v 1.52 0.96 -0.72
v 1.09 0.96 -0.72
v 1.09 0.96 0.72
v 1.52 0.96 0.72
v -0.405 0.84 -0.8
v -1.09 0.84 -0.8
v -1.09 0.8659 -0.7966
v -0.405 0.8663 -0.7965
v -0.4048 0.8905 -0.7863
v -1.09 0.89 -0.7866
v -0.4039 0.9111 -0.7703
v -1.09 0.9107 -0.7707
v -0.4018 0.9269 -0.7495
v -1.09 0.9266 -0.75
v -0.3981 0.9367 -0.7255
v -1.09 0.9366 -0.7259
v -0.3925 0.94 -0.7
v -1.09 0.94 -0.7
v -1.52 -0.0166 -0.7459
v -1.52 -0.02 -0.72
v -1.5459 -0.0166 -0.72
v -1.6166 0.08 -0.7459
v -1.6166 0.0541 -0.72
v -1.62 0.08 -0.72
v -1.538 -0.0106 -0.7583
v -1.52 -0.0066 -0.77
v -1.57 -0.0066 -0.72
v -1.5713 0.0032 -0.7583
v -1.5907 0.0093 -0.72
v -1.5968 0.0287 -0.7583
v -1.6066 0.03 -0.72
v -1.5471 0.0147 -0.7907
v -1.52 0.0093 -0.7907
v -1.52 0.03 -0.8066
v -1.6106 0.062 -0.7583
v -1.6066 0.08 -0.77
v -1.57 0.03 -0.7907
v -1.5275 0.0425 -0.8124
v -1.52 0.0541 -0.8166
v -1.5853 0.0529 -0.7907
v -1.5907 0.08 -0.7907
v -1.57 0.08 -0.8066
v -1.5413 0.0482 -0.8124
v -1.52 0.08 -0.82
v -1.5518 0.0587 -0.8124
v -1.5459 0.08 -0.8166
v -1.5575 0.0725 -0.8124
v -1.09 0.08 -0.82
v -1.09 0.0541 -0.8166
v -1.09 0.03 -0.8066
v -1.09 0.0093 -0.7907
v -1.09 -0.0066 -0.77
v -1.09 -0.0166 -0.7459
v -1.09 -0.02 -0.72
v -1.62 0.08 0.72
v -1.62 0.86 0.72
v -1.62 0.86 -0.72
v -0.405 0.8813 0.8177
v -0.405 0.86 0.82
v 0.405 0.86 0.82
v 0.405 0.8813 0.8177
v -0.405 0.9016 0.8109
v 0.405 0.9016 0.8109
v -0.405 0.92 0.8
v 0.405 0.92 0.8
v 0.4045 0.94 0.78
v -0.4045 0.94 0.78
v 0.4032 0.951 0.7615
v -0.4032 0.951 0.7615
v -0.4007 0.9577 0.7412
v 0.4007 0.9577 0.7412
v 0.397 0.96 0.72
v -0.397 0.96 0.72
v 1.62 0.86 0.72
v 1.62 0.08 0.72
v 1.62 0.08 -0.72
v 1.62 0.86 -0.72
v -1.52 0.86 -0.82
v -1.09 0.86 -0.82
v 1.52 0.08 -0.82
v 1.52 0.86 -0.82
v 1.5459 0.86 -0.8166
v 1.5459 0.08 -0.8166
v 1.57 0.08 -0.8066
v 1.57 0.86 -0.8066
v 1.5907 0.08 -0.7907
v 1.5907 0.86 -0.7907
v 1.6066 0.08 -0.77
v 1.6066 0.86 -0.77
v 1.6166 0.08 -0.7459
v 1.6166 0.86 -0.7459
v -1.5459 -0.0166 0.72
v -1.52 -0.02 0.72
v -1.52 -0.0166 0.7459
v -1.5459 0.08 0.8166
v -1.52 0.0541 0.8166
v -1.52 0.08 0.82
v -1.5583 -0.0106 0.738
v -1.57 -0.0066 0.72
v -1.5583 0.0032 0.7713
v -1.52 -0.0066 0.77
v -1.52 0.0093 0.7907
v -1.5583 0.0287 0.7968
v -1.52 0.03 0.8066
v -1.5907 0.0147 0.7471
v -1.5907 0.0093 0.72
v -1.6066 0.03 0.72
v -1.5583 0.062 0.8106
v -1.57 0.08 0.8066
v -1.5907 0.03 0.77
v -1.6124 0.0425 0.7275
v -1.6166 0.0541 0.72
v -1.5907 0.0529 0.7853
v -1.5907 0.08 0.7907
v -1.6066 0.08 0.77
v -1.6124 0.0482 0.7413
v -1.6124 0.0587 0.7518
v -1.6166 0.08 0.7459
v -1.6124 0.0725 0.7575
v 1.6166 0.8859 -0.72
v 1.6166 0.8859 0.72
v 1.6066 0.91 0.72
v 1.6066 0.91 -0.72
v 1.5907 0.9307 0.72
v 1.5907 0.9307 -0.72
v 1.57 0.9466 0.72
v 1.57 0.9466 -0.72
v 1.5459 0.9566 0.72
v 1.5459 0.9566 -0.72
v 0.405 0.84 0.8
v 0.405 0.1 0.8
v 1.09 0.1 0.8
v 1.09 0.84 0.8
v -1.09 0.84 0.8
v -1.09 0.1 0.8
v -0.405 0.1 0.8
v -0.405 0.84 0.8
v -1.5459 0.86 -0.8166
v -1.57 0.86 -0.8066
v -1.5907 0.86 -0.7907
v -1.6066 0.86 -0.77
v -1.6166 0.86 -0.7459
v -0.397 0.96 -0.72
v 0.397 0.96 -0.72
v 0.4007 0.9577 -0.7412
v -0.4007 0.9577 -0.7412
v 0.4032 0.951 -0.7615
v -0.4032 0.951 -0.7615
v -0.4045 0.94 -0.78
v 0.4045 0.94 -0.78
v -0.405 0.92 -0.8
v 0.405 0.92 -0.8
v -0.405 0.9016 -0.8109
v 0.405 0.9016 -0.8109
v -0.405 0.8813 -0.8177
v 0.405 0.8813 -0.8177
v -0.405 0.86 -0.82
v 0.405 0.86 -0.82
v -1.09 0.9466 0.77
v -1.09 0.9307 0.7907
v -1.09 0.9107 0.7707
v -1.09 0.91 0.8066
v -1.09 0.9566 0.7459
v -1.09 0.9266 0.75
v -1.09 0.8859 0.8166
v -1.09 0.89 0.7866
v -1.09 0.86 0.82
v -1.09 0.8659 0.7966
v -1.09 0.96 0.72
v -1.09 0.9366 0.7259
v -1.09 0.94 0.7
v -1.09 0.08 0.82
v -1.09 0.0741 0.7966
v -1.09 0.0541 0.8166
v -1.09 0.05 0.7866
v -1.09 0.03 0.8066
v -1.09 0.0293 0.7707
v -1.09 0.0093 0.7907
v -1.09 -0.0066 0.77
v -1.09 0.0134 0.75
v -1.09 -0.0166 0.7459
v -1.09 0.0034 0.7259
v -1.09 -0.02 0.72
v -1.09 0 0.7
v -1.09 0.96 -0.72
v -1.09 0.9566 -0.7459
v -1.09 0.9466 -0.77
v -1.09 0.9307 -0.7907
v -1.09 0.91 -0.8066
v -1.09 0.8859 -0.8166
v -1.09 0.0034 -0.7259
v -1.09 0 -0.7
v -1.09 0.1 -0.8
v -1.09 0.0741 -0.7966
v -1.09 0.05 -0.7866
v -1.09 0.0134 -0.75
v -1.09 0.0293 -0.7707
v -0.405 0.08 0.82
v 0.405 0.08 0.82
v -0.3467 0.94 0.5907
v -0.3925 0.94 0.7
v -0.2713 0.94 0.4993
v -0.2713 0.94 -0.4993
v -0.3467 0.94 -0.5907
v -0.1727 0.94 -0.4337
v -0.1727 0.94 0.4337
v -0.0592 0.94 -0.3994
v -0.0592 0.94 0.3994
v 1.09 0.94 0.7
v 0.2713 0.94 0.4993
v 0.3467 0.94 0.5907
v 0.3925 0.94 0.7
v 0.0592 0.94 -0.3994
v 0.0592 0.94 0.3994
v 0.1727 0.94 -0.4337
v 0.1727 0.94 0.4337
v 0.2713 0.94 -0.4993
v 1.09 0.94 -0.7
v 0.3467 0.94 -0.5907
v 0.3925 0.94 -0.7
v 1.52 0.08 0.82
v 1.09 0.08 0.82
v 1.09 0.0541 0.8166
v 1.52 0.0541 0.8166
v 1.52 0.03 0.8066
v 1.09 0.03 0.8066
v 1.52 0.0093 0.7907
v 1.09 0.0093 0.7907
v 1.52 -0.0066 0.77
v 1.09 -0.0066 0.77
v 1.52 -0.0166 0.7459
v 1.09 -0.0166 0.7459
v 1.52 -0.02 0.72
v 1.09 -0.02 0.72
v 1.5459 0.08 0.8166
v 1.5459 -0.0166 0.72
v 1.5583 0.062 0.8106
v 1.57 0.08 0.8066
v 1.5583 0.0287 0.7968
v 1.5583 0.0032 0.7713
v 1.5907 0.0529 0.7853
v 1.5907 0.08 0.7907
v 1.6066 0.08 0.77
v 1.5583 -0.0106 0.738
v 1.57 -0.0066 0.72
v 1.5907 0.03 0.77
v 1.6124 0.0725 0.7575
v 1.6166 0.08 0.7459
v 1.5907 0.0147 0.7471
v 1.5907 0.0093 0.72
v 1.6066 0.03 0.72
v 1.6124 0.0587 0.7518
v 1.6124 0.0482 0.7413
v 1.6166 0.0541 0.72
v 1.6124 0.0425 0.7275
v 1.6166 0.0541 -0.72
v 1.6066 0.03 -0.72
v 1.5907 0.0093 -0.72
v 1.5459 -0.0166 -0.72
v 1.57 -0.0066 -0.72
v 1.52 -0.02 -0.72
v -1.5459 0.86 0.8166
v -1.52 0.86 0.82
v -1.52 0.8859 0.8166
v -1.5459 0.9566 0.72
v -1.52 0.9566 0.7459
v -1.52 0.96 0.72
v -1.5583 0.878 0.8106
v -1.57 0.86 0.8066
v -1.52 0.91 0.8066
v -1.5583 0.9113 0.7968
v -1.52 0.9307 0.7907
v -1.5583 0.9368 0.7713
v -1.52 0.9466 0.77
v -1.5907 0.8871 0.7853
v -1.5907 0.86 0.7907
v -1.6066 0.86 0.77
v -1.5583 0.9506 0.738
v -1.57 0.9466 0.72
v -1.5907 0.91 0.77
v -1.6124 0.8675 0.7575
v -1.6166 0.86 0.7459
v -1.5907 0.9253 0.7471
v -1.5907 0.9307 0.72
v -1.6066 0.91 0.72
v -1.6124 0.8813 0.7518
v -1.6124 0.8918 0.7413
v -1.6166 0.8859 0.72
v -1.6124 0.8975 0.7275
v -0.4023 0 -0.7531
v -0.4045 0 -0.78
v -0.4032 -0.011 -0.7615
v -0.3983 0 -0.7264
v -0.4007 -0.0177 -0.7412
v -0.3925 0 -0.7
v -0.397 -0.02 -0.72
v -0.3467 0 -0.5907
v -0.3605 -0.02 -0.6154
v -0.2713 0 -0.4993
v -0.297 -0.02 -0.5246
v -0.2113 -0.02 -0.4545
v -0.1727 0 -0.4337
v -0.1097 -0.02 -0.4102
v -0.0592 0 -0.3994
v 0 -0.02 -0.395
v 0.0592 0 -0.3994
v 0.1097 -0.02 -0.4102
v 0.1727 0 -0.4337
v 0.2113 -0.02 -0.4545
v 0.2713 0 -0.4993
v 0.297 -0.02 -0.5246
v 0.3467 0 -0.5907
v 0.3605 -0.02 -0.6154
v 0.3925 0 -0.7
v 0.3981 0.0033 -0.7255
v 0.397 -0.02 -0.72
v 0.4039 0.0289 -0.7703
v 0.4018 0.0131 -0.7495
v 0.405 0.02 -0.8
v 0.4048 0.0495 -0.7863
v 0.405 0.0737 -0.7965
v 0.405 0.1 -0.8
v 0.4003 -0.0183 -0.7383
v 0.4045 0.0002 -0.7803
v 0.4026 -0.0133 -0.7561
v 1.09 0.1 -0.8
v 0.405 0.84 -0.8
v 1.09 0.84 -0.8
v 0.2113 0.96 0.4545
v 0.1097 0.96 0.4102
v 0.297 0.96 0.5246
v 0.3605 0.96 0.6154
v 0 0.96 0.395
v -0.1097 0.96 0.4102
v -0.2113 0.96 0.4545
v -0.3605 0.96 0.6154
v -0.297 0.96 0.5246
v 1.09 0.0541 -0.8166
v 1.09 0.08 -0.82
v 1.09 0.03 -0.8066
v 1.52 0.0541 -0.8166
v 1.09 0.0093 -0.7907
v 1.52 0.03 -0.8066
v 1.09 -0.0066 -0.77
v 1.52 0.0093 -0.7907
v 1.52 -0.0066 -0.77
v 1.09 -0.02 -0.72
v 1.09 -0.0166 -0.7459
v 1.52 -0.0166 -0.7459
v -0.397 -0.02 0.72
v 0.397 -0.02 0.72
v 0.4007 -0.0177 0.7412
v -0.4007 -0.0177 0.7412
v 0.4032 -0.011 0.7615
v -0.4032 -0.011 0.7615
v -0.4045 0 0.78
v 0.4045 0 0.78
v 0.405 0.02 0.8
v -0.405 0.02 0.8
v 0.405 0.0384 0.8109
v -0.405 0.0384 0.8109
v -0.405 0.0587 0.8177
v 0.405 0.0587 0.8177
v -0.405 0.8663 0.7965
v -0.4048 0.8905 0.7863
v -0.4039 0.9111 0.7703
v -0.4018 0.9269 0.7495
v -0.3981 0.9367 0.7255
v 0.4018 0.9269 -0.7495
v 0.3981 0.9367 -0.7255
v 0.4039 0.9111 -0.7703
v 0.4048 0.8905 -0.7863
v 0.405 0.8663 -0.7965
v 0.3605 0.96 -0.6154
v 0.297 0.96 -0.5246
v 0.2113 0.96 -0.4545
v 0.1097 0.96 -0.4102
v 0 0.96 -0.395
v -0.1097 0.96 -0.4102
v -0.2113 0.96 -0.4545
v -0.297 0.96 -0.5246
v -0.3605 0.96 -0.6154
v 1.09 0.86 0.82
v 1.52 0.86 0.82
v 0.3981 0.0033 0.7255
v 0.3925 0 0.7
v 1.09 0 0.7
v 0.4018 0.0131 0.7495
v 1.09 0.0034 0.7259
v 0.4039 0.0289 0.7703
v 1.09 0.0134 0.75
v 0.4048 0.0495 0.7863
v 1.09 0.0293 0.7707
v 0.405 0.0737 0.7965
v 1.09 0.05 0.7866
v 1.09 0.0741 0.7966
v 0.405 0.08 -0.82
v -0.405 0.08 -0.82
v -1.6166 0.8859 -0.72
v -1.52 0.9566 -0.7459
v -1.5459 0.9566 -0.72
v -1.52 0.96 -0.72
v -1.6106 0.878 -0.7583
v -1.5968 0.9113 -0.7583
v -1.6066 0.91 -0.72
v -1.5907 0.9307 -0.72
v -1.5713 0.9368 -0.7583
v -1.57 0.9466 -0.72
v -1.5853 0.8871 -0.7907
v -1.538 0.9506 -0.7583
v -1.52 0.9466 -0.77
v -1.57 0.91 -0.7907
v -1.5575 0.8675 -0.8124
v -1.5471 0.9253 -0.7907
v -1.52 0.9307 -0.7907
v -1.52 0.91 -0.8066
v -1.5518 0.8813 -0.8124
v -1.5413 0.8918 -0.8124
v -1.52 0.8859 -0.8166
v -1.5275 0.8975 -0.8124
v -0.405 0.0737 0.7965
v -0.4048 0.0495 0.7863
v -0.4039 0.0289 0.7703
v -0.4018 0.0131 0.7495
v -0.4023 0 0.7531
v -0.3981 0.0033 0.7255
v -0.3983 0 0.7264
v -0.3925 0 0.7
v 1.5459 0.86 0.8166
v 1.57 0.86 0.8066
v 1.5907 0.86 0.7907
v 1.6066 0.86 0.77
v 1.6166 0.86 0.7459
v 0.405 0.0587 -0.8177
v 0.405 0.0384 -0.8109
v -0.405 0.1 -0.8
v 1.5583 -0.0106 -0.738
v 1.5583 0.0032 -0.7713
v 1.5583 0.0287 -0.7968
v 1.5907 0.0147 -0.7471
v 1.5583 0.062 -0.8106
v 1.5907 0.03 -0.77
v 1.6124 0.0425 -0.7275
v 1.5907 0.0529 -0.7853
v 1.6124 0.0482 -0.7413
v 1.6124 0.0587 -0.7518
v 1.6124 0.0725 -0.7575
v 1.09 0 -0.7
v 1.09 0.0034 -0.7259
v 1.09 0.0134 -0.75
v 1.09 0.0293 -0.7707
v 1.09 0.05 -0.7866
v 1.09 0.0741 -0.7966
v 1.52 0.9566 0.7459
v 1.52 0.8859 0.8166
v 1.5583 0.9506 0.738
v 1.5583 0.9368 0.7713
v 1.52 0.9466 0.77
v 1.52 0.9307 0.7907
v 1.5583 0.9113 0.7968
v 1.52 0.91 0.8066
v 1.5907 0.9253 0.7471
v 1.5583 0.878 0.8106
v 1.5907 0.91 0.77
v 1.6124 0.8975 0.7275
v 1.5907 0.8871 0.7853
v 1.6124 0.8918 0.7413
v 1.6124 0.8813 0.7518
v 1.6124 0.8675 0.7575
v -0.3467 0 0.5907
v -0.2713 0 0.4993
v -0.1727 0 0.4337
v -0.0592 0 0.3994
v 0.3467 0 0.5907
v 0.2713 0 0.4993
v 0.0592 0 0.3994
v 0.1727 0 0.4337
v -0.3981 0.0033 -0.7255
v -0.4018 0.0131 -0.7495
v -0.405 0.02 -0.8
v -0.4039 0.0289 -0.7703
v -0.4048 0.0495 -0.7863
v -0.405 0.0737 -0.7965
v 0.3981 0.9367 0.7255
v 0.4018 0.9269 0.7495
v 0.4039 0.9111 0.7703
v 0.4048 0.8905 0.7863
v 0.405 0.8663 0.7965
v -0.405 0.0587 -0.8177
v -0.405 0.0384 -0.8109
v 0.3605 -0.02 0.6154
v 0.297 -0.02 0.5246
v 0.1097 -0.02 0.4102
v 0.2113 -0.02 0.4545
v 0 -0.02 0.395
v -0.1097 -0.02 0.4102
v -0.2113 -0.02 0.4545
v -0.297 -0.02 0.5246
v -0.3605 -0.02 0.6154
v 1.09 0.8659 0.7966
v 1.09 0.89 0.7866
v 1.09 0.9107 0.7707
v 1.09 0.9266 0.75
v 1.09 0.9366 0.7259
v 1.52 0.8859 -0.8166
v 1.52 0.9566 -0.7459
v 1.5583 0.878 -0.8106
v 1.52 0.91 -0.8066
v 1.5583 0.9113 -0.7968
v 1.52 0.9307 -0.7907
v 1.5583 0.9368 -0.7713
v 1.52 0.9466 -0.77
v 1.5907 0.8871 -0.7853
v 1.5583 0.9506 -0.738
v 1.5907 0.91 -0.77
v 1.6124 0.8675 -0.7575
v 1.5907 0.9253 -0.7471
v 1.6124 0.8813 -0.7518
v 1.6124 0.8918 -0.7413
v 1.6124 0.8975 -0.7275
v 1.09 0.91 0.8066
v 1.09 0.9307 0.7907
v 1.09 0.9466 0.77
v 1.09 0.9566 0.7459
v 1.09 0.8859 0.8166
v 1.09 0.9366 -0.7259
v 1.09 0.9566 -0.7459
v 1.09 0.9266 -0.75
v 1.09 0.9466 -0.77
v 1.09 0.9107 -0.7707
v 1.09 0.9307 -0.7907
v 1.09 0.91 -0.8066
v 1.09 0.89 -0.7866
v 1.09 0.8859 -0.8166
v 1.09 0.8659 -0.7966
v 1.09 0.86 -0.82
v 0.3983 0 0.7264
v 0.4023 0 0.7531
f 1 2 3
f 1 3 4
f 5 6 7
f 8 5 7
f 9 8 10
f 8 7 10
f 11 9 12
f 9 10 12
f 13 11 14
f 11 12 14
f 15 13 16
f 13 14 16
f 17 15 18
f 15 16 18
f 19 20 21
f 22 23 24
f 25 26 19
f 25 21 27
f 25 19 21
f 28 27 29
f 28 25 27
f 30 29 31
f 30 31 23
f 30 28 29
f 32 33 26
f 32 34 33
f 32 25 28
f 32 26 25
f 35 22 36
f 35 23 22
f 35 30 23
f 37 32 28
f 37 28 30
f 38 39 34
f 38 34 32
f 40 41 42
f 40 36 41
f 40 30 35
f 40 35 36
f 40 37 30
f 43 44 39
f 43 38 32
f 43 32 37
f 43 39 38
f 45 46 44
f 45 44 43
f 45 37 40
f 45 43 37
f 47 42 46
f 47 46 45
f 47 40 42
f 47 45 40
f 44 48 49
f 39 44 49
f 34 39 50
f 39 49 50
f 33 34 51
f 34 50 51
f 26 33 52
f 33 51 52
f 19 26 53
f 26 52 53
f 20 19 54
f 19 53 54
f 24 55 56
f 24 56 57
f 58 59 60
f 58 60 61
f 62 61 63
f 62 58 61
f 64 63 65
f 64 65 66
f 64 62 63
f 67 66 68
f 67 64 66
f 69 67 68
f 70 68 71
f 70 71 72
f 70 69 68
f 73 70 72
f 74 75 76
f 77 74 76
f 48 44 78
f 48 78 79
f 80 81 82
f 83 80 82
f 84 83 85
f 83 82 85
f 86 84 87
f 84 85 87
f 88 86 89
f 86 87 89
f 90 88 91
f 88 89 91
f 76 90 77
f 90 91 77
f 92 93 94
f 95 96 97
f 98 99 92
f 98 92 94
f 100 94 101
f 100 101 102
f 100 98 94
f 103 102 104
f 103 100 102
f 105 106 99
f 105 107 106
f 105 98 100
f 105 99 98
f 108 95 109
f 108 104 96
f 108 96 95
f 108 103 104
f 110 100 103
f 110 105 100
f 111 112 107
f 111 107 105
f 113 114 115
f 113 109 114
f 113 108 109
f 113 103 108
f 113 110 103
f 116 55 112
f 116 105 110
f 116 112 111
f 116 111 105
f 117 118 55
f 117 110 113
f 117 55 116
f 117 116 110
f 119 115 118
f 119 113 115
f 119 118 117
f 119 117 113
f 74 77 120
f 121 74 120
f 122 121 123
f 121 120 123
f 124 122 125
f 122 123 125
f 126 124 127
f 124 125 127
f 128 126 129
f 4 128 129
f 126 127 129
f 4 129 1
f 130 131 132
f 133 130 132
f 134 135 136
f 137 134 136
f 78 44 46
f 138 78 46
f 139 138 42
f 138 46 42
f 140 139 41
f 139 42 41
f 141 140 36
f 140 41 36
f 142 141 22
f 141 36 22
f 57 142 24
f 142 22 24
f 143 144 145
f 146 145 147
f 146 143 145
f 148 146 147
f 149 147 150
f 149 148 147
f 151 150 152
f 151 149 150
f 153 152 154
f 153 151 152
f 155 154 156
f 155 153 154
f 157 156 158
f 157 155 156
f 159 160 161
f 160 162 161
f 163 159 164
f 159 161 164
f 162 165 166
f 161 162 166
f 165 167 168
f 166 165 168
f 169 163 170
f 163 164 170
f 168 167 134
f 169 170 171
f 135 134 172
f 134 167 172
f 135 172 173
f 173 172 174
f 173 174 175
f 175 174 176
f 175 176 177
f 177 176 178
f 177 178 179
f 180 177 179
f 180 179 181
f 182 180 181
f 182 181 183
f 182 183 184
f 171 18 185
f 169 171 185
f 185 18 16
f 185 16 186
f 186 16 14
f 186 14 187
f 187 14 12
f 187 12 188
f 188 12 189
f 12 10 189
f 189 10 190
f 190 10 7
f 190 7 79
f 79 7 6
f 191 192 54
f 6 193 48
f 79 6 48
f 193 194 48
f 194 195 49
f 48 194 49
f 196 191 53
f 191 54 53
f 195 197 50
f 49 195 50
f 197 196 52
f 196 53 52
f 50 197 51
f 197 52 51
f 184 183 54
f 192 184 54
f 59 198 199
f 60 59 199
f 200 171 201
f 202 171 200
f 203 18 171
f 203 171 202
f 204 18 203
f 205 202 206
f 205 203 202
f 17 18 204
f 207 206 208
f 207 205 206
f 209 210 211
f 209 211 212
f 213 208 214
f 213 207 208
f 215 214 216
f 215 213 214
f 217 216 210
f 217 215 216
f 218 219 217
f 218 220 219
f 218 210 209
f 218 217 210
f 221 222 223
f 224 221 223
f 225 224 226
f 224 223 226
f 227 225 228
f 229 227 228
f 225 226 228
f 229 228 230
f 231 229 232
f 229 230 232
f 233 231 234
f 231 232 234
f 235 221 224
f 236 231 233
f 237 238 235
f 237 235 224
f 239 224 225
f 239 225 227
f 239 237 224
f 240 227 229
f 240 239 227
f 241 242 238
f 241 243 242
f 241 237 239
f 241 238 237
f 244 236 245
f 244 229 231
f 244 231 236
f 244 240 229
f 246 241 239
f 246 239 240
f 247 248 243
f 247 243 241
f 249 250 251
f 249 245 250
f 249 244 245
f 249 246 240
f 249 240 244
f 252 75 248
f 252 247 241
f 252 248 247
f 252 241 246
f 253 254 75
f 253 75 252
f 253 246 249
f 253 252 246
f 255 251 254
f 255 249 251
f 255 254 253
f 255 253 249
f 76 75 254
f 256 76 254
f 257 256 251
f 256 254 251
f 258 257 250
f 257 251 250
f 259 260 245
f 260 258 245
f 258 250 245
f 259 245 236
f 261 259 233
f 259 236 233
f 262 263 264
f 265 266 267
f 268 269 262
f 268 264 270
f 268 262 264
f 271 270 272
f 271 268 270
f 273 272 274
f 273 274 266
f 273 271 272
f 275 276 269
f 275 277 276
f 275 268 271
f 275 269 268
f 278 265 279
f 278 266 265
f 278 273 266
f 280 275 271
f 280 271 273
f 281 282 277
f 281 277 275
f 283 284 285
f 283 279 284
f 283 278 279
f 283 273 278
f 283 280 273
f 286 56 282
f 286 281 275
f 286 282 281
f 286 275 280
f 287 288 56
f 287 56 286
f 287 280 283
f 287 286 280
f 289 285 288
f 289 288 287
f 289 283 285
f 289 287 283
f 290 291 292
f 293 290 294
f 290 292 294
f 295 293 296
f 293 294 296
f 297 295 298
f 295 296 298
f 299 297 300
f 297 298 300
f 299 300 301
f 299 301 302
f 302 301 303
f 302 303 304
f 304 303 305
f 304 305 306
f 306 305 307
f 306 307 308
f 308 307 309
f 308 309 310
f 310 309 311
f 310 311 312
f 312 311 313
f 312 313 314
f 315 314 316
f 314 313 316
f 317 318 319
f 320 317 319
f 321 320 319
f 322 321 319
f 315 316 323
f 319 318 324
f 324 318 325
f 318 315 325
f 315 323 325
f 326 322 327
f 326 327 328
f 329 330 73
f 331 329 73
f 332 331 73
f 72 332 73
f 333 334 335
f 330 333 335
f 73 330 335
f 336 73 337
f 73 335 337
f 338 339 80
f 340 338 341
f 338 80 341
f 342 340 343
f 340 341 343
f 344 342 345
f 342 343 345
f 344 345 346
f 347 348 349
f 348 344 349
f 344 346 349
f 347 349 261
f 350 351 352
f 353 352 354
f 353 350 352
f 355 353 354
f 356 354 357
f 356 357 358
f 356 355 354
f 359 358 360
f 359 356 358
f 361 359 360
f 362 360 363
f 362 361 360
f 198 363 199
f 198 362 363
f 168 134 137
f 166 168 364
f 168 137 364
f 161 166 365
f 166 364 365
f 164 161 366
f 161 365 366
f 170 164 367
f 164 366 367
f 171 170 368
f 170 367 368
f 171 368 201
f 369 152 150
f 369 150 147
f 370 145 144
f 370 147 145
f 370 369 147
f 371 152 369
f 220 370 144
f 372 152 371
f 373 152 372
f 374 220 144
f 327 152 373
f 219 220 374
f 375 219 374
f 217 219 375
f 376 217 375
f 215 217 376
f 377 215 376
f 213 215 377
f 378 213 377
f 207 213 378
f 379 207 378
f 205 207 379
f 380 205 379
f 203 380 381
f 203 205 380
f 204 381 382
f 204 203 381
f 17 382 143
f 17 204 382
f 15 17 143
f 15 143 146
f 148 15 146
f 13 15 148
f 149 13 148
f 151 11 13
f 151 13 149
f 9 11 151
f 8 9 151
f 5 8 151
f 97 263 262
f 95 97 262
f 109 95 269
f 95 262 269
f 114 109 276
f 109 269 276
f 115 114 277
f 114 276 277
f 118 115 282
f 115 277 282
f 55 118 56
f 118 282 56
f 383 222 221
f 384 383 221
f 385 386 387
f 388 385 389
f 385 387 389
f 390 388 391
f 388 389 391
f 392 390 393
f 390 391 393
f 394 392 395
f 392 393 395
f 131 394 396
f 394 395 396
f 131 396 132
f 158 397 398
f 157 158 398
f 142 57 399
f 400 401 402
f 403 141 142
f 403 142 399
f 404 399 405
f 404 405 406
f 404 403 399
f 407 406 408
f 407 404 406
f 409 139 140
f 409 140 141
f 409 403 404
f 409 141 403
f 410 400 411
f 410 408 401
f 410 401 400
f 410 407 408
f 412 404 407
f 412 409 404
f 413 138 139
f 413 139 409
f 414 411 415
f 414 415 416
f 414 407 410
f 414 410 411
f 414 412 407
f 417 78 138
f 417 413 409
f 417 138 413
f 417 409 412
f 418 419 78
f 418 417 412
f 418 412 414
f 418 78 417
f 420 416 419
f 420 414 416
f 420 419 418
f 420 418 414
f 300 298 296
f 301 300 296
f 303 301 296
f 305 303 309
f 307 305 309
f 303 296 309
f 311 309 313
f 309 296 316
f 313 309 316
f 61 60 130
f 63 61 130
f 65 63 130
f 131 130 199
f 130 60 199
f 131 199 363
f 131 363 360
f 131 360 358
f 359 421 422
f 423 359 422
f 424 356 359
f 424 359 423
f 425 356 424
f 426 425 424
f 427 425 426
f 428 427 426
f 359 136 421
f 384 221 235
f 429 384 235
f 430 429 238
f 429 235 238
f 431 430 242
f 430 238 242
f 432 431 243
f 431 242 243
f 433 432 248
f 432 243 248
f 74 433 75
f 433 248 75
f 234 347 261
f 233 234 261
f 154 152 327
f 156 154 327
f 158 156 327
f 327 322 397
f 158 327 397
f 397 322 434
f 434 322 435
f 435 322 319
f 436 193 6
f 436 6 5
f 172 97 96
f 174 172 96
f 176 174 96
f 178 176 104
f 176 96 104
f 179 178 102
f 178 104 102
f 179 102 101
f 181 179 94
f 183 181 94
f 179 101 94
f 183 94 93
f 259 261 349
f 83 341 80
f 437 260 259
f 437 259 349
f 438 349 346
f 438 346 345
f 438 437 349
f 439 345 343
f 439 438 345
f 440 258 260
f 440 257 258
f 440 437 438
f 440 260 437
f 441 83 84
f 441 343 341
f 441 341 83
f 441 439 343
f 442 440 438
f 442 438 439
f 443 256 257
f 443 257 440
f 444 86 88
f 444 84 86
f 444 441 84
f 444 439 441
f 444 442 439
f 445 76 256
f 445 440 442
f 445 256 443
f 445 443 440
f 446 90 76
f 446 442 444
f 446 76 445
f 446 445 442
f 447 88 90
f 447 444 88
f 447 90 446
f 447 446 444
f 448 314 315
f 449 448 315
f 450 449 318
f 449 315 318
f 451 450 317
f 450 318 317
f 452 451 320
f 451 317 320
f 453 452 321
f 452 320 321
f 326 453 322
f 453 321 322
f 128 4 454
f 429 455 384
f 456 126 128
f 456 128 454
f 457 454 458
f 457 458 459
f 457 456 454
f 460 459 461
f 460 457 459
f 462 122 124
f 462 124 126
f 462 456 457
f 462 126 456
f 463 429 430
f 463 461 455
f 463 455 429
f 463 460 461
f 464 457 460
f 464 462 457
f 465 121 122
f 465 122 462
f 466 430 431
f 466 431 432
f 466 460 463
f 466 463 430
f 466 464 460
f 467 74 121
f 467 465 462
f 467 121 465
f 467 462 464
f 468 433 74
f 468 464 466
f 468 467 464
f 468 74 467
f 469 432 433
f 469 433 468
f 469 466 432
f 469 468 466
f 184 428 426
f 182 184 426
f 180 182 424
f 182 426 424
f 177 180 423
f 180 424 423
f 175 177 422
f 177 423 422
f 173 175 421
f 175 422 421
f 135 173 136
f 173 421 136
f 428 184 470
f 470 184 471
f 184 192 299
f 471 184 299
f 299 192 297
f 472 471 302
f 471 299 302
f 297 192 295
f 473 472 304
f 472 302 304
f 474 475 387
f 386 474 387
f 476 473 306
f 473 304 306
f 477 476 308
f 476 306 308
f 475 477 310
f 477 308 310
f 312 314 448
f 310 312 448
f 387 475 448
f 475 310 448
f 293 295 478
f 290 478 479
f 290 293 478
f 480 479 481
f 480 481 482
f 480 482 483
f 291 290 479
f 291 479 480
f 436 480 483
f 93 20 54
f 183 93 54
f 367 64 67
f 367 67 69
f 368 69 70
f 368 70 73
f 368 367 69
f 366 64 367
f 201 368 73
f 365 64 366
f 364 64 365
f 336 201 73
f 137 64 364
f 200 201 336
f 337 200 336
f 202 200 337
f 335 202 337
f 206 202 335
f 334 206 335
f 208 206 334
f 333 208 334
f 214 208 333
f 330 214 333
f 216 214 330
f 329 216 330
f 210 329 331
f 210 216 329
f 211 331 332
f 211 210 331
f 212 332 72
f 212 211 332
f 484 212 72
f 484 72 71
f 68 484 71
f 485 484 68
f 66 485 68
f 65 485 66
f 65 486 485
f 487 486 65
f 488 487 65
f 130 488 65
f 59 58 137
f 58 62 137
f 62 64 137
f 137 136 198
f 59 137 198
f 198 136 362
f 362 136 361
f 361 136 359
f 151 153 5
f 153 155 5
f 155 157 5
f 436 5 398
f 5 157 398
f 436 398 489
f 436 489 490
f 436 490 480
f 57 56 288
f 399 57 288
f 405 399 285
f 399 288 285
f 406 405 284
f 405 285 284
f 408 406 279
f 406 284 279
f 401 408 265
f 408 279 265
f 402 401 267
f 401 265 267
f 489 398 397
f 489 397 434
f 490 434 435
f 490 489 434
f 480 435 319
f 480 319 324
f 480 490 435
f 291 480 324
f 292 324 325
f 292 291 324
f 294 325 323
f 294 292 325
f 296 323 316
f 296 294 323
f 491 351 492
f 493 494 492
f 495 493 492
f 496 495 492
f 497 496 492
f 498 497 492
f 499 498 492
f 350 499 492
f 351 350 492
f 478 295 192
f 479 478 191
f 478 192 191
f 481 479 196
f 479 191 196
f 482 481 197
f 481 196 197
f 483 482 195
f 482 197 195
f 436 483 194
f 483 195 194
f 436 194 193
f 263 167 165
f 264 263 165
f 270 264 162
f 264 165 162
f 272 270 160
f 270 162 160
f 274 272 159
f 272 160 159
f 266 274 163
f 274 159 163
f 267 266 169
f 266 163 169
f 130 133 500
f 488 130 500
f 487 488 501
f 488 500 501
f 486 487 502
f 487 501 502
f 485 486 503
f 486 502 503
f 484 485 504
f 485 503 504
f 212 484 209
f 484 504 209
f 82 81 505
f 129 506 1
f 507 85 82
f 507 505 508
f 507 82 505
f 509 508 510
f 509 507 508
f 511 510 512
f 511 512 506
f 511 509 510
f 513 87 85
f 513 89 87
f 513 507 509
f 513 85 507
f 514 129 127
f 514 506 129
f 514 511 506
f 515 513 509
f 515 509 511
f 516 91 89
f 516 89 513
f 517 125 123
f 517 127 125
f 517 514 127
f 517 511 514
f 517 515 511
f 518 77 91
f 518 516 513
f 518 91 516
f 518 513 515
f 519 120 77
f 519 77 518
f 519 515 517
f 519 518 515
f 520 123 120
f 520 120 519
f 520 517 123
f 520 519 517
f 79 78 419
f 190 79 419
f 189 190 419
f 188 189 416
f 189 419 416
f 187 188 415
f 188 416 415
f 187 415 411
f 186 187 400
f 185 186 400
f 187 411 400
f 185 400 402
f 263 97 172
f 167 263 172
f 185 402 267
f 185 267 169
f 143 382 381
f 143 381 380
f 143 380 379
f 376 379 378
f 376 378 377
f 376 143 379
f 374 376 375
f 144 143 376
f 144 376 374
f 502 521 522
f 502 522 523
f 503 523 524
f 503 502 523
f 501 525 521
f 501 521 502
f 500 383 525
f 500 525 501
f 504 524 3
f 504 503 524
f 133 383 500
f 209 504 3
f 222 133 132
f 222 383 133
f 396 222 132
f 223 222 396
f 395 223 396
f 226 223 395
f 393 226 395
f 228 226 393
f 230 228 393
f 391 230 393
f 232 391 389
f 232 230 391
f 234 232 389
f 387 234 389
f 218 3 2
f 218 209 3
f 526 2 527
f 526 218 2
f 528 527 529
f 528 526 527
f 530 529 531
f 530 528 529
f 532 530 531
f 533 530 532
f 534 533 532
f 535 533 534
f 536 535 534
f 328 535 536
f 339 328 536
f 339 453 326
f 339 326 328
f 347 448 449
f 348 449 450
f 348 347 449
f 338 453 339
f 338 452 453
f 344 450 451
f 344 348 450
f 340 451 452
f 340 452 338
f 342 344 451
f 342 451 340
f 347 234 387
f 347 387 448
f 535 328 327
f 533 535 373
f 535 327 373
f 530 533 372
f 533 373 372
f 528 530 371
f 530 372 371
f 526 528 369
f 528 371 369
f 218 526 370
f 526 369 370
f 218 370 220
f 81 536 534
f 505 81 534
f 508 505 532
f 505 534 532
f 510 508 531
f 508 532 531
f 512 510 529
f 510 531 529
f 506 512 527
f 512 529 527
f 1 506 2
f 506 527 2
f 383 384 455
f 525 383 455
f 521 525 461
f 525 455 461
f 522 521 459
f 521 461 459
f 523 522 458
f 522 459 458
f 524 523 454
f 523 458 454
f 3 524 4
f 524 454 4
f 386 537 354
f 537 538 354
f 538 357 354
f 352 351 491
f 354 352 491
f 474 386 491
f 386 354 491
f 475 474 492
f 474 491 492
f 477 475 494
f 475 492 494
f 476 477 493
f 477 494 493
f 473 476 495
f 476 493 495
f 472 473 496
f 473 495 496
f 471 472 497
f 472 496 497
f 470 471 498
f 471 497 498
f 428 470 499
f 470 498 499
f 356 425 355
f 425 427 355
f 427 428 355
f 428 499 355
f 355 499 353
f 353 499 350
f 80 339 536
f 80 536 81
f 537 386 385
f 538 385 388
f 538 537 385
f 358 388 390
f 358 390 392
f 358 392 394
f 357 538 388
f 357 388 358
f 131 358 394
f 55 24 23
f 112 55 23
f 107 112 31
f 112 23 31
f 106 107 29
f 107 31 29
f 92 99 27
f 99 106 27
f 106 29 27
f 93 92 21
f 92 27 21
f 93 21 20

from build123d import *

# Parameters (mm, degrees)
SKETCH1_W           = 3.2
SKETCH1_H           = 1.6
BOSS_EXTRUDE1_DEPTH = 0.94
SKETCH2_W           = 0.53
SKETCH2_H           = 1.64
BOSS_EXTRUDE2_DEPTH = 0.02
BOSS_EXTRUDE3_START = -0.96
SKETCH3_W           = 0.53
SKETCH3_H           = 1.64
BOSS_EXTRUDE3_DEPTH = 0.96
FILLET1_R           = 0.1
FILLET2_START       = -1
FILLET2_DEPTH       = 2


with BuildPart() as part:
    # Sketch1 → Boss-Extrude1 (new body)
    with BuildSketch(Plane(origin=(0, 0, 0), x_dir=(1, 0, 0), z_dir=(0, 1, 0))):
        Rectangle(SKETCH1_W, SKETCH1_H)
    extrude(amount=BOSS_EXTRUDE1_DEPTH)

    # Sketch2 → Boss-Extrude2 (add)
    with BuildSketch(Plane(origin=(0, 0.94, 0), x_dir=(1, 0, 0), z_dir=(0, 1, 0))):
        with BuildLine():
            Line((-0.405, 0.82), (-0.405, 0.8))
            ThreePointArc((-0.405, 0.8), (0, 0.395), (0.405, 0.8))
            Line((0.405, 0.8), (0.405, 0.82))
            Line((0.405, 0.82), (-0.405, 0.82))
        make_face()
        with Locations((-1.355, 0)):
            Rectangle(SKETCH2_W, SKETCH2_H)
        with Locations((1.355, 0)):
            Rectangle(SKETCH2_W, SKETCH2_H)
        with BuildLine():
            Line((-0.405, -0.82), (-0.405, -0.8))
            ThreePointArc((-0.405, -0.8), (0, -0.395), (0.405, -0.8))
            Line((0.405, -0.8), (0.405, -0.82))
            Line((0.405, -0.82), (-0.405, -0.82))
        make_face()
    extrude(amount=BOSS_EXTRUDE2_DEPTH)

    # Sketch3 → Boss-Extrude3 (add)
    with BuildSketch(Plane(origin=(0, 0.94, 0), x_dir=(1, 0, 0), z_dir=(0, 1, 0)).offset(BOSS_EXTRUDE3_START)):
        with Locations((-1.355, 0)):
            Rectangle(SKETCH3_W, SKETCH3_H)
        with BuildLine():
            Line((-0.405, 0.82), (-0.405, 0.8))
            ThreePointArc((-0.405, 0.8), (0, 0.395), (0.405, 0.8))
            Line((0.405, 0.8), (0.405, 0.82))
            Line((0.405, 0.82), (-0.405, 0.82))
        make_face()
        with BuildLine():
            Line((-0.405, -0.8), (-0.405, -0.82))
            Line((-0.405, -0.82), (0.405, -0.82))
            Line((0.405, -0.82), (0.405, -0.8))
            ThreePointArc((0.405, -0.8), (0, -0.395), (-0.405, -0.8))
        make_face()
        with Locations((1.355, 0)):
            Rectangle(SKETCH3_W, SKETCH3_H)
    extrude(amount=BOSS_EXTRUDE3_DEPTH)

    # Fillet1
    # the kernel refuses this fillet: 0.1 mm, written as the material it takes off along each edge
    with BuildSketch(Plane(origin=(1.52, 0.08, 0.72), x_dir=(0, -1, 0), z_dir=(1, 0, 0))) as fillet1_piece_1_section:
        Polygon((0, 0), (FILLET1_R, 0), (FILLET1_R, -FILLET1_R), (0, -FILLET1_R), align=None)
    fillet1_piece_1 = extrude(amount=FILLET1_R, mode=Mode.PRIVATE)
    fillet1_piece_1 = fillet1_piece_1 - Plane(origin=(1.52, 0.08, 0.72), x_dir=(1.184975440516056e-15, 0.7071067811865475, -0.7071067811865475), z_dir=(1, 0, 0)) * Sphere(FILLET1_R, mode=Mode.PRIVATE)
    add(fillet1_piece_1, mode=Mode.SUBTRACT)
    with BuildSketch(Plane(origin=(1.52, 0.08, -0.72), x_dir=(0, 0, -1), z_dir=(1, 0, 0))) as fillet1_piece_2_section:
        Polygon((0, 0), (FILLET1_R, 0), (FILLET1_R, -FILLET1_R), (0, -FILLET1_R), align=None)
    fillet1_piece_2 = extrude(amount=FILLET1_R, mode=Mode.PRIVATE)
    fillet1_piece_2 = fillet1_piece_2 - Plane(origin=(1.52, 0.08, -0.72), x_dir=(0, 0.7071067811865475, 0.7071067811865475), z_dir=(1, 0, 0)) * Sphere(FILLET1_R, mode=Mode.PRIVATE)
    add(fillet1_piece_2, mode=Mode.SUBTRACT)
    with BuildSketch(Plane(origin=(-1.52, 0.08, -0.72), x_dir=(-1, 0, 0), z_dir=(0, 0, -1))) as fillet1_piece_3_section:
        Polygon((0, 0), (FILLET1_R, 0), (FILLET1_R, -FILLET1_R), (0, -FILLET1_R), align=None)
    fillet1_piece_3 = extrude(amount=FILLET1_R, mode=Mode.PRIVATE)
    fillet1_piece_3 = fillet1_piece_3 - Plane(origin=(-1.52, 0.08, -0.72), x_dir=(0.7071067811865475, 0.7071067811865475, 0), z_dir=(0, 0, -1)) * Sphere(FILLET1_R, mode=Mode.PRIVATE)
    add(fillet1_piece_3, mode=Mode.SUBTRACT)
    with BuildSketch(Plane(origin=(-1.52, 0.86, -0.72), x_dir=(-1, 0, 0), z_dir=(0, 0, -1))) as fillet1_piece_4_section:
        Polygon((0, 0), (FILLET1_R, 0), (FILLET1_R, FILLET1_R), (0, FILLET1_R), align=None)
    fillet1_piece_4 = extrude(amount=FILLET1_R, mode=Mode.PRIVATE)
    fillet1_piece_4 = fillet1_piece_4 - Plane(origin=(-1.52, 0.86, -0.72), x_dir=(0.7071067811865475, -0.7071067811865475, 0), z_dir=(0, 0, -1)) * Sphere(FILLET1_R, mode=Mode.PRIVATE)
    add(fillet1_piece_4, mode=Mode.SUBTRACT)
    with BuildSketch(Plane(origin=(-1.52, 0.86, 0.72), x_dir=(0, 1, 0), z_dir=(-1, 0, 0))) as fillet1_piece_5_section:
        Polygon((0, 0), (FILLET1_R, 0), (FILLET1_R, -FILLET1_R), (0, -FILLET1_R), align=None)
    fillet1_piece_5 = extrude(amount=FILLET1_R, mode=Mode.PRIVATE)
    fillet1_piece_5 = fillet1_piece_5 - Plane(origin=(-1.52, 0.86, 0.72), x_dir=(0, -0.7071067811865475, -0.7071067811865475), z_dir=(-1, 0, 0)) * Sphere(FILLET1_R, mode=Mode.PRIVATE)
    add(fillet1_piece_5, mode=Mode.SUBTRACT)
    with BuildSketch(Plane(origin=(-1.52, 0.08, 0.72), x_dir=(0, 0, 1), z_dir=(-1, 0, 0))) as fillet1_piece_6_section:
        Polygon((0, 0), (FILLET1_R, 0), (FILLET1_R, -FILLET1_R), (0, -FILLET1_R), align=None)
    fillet1_piece_6 = extrude(amount=FILLET1_R, mode=Mode.PRIVATE)
    fillet1_piece_6 = fillet1_piece_6 - Plane(origin=(-1.52, 0.08, 0.72), x_dir=(0, 0.7071067811865475, -0.7071067811865475), z_dir=(-1, 0, 0)) * Sphere(FILLET1_R, mode=Mode.PRIVATE)
    add(fillet1_piece_6, mode=Mode.SUBTRACT)
    with BuildSketch(Plane(origin=(1.52, 0.86, 0.72), x_dir=(0, 1, 0), z_dir=(1, 0, 0))) as fillet1_piece_7_section:
        Polygon((0, 0), (FILLET1_R, 0), (FILLET1_R, FILLET1_R), (0, FILLET1_R), align=None)
    fillet1_piece_7 = extrude(amount=FILLET1_R, mode=Mode.PRIVATE)
    fillet1_piece_7 = fillet1_piece_7 - Plane(origin=(1.52, 0.86, 0.72), x_dir=(1.184975440516056e-15, -0.7071067811865475, -0.7071067811865475), z_dir=(1, 0, 0)) * Sphere(FILLET1_R, mode=Mode.PRIVATE)
    add(fillet1_piece_7, mode=Mode.SUBTRACT)
    with BuildSketch(Plane(origin=(1.52, 0.86, -0.72), x_dir=(0, 1, 0), z_dir=(1, 0, 0))) as fillet1_piece_8_section:
        Polygon((0, 0), (FILLET1_R, 0), (FILLET1_R, -FILLET1_R), (0, -FILLET1_R), align=None)
    fillet1_piece_8 = extrude(amount=FILLET1_R, mode=Mode.PRIVATE)
    fillet1_piece_8 = fillet1_piece_8 - Plane(origin=(1.52, 0.86, -0.72), x_dir=(0, -0.7071067811865475, 0.7071067811865475), z_dir=(1, 0, 0)) * Sphere(FILLET1_R, mode=Mode.PRIVATE)
    add(fillet1_piece_8, mode=Mode.SUBTRACT)
    with BuildSketch(Plane(origin=(0.155, 0, -0.8), x_dir=(0, 1, 0), z_dir=(1, 0, 0))) as fillet1_piece_9_section:
        with BuildLine():
            CenterArc((FILLET1_R, FILLET1_R), FILLET1_R, 180, 90)
            Line((0, FILLET1_R), (0, 0))
            Line((0, 0), (FILLET1_R, 0))
        make_face()
    fillet1_piece_9 = extrude(amount=0.935, mode=Mode.PRIVATE)
    fillet1_piece_9 = fillet1_piece_9 - Plane(origin=(0, 0, -0.8), x_dir=(-1, 0, 0), z_dir=(0, -1, 0)) * Cylinder(0.405, 3, mode=Mode.PRIVATE)
    add(fillet1_piece_9, mode=Mode.SUBTRACT)
    with BuildSketch(Plane(origin=(1.62, -0.02, 0.72), x_dir=(0, 1, 0), z_dir=(0, 0, -1)), Plane(origin=(-1.62, 0.96, 0.72), x_dir=(0, -1, 0), z_dir=(0, 0, -1)), Plane(origin=(1.62, 0.96, -0.72), x_dir=(0, -1, 0), z_dir=(0, 0, 1)), Plane(origin=(-1.62, -0.02, -0.72), x_dir=(0, 1, 0), z_dir=(0, 0, 1))) as fillet1_piece_10:
        with BuildLine():
            CenterArc((FILLET1_R, -FILLET1_R), FILLET1_R, 90, 90)
            Line((0, -FILLET1_R), (0, 0))
            Line((0, 0), (FILLET1_R, 0))
        make_face()
    extrude(amount=1.44, mode=Mode.SUBTRACT)
    with BuildSketch(Plane(origin=(0.84, -0.02, 0.82), x_dir=(0, 1, 0), z_dir=(1, 0, 0)), Plane(origin=(1.52, -0.02, -0.82), x_dir=(0, 1, 0), z_dir=(-1, 0, 0)), Plane(origin=(-1.52, 0.96, -0.82), x_dir=(0, -1, 0), z_dir=(1, 0, 0)), Plane(origin=(1.52, 0.96, 0.82), x_dir=(0, -1, 0), z_dir=(-1, 0, 0)), Plane(origin=(-0.84, -0.02, -0.82), x_dir=(0, 1, 0), z_dir=(-1, 0, 0)), Plane(origin=(-1.52, -0.02, 0.82), x_dir=(0, 1, 0), z_dir=(1, 0, 0))) as fillet1_piece_11:
        with BuildLine():
            CenterArc((FILLET1_R, -FILLET1_R), FILLET1_R, 90, 90)
            Line((0, -FILLET1_R), (0, 0))
            Line((0, 0), (FILLET1_R, 0))
        make_face()
    extrude(amount=0.68, mode=Mode.SUBTRACT)
    with BuildSketch(Plane(origin=(-0.155, 0.94, 0.8), x_dir=(0, -1, 0), z_dir=(-1, 0, 0))) as fillet1_piece_12_section:
        with BuildLine():
            CenterArc((FILLET1_R, -FILLET1_R), FILLET1_R, 90, 90)
            Line((0, -FILLET1_R), (0, 0))
            Line((0, 0), (FILLET1_R, 0))
        make_face()
    fillet1_piece_12 = extrude(amount=0.935, mode=Mode.PRIVATE)
    fillet1_piece_12 = fillet1_piece_12 - Plane(origin=(0, 0.94, 0.8), x_dir=(-1, 0, 0), z_dir=(0, -1, 0)) * Cylinder(0.405, 3, mode=Mode.PRIVATE)
    add(fillet1_piece_12, mode=Mode.SUBTRACT)
    with BuildSketch(Plane(origin=(-1.62, 0.08, -0.82), x_dir=(1, 0, 0), z_dir=(0, 1, 0)), Plane(origin=(1.62, 0.08, 0.82), x_dir=(-1, 0, 0), z_dir=(0, 1, 0))) as fillet1_piece_13:
        with BuildLine():
            CenterArc((FILLET1_R, -FILLET1_R), FILLET1_R, 90, 90)
            Line((0, -FILLET1_R), (0, 0))
            Line((0, 0), (FILLET1_R, 0))
        make_face()
    extrude(amount=0.78, mode=Mode.SUBTRACT)
    with BuildSketch(Plane(origin=(-1.62, 0.86, 0.82), x_dir=(0, 0, -1), z_dir=(0, -1, 0)), Plane(origin=(1.62, 0.86, -0.82), x_dir=(0, 0, 1), z_dir=(0, -1, 0))) as fillet1_piece_14:
        with BuildLine():
            CenterArc((FILLET1_R, FILLET1_R), FILLET1_R, 180, 90)
            Line((0, FILLET1_R), (0, 0))
            Line((0, 0), (FILLET1_R, 0))
        make_face()
    extrude(amount=0.78, mode=Mode.SUBTRACT)
    with BuildSketch(Plane(origin=(-0.84, 0.96, 0.82), x_dir=(0, 0, -1), z_dir=(-1, 0, 0)), Plane(origin=(0.84, 0.96, -0.82), x_dir=(0, 0, 1), z_dir=(1, 0, 0))) as fillet1_piece_15:
        with BuildLine():
            CenterArc((FILLET1_R, FILLET1_R), FILLET1_R, 180, 90)
            Line((0, FILLET1_R), (0, 0))
            Line((0, 0), (FILLET1_R, 0))
        make_face()
    extrude(amount=0.68, mode=Mode.SUBTRACT)
    with BuildSketch(Plane(origin=(-1.09, 0.94, -0.8), x_dir=(0, -1, 0), z_dir=(1, 0, 0))) as fillet1_piece_16_section:
        with BuildLine():
            CenterArc((FILLET1_R, -FILLET1_R), FILLET1_R, 90, 90)
            Line((0, -FILLET1_R), (0, 0))
            Line((0, 0), (FILLET1_R, 0))
        make_face()
    fillet1_piece_16 = extrude(amount=0.935, mode=Mode.PRIVATE)
    fillet1_piece_16 = fillet1_piece_16 - Plane(origin=(0, 0.94, -0.8), x_dir=(-1, 0, 0), z_dir=(0, -1, 0)) * Cylinder(0.405, 3, mode=Mode.PRIVATE)
    add(fillet1_piece_16, mode=Mode.SUBTRACT)
    with BuildSketch(Plane(origin=(0.155, 0.94, -0.8), x_dir=(0, -1, 0), z_dir=(1, 0, 0))) as fillet1_piece_17_section:
        with BuildLine():
            CenterArc((FILLET1_R, -FILLET1_R), FILLET1_R, 90, 90)
            Line((0, -FILLET1_R), (0, 0))
            Line((0, 0), (FILLET1_R, 0))
        make_face()
    fillet1_piece_17 = extrude(amount=0.935, mode=Mode.PRIVATE)
    fillet1_piece_17 = fillet1_piece_17 - Plane(origin=(0, 0.94, -0.8), x_dir=(-1, 0, 0), z_dir=(0, -1, 0)) * Cylinder(0.405, 3, mode=Mode.PRIVATE)
    add(fillet1_piece_17, mode=Mode.SUBTRACT)
    with BuildSketch(Plane(origin=(1.09, 0.94, 0.8), x_dir=(0, -1, 0), z_dir=(-1, 0, 0))) as fillet1_piece_18_section:
        with BuildLine():
            CenterArc((FILLET1_R, -FILLET1_R), FILLET1_R, 90, 90)
            Line((0, -FILLET1_R), (0, 0))
            Line((0, 0), (FILLET1_R, 0))
        make_face()
    fillet1_piece_18 = extrude(amount=0.935, mode=Mode.PRIVATE)
    fillet1_piece_18 = fillet1_piece_18 - Plane(origin=(0, 0.94, 0.8), x_dir=(-1, 0, 0), z_dir=(0, -1, 0)) * Cylinder(0.405, 3, mode=Mode.PRIVATE)
    add(fillet1_piece_18, mode=Mode.SUBTRACT)
    with BuildSketch(Plane(origin=(-0.155, 0, 0.8), x_dir=(0, 1, 0), z_dir=(-1, 0, 0))) as fillet1_piece_19_section:
        with BuildLine():
            CenterArc((FILLET1_R, FILLET1_R), FILLET1_R, 180, 90)
            Line((0, FILLET1_R), (0, 0))
            Line((0, 0), (FILLET1_R, 0))
        make_face()
    fillet1_piece_19 = extrude(amount=0.935, mode=Mode.PRIVATE)
    fillet1_piece_19 = fillet1_piece_19 - Plane(origin=(0, 0, 0.8), x_dir=(1, 0, 0), z_dir=(0, -1, 0)) * Cylinder(0.405, 3, mode=Mode.PRIVATE)
    add(fillet1_piece_19, mode=Mode.SUBTRACT)
    with BuildSketch(Plane(origin=(-1.09, 0, -0.8), x_dir=(0, 1, 0), z_dir=(1, 0, 0))) as fillet1_piece_20_section:
        with BuildLine():
            CenterArc((FILLET1_R, FILLET1_R), FILLET1_R, 180, 90)
            Line((0, FILLET1_R), (0, 0))
            Line((0, 0), (FILLET1_R, 0))
        make_face()
    fillet1_piece_20 = extrude(amount=0.935, mode=Mode.PRIVATE)
    fillet1_piece_20 = fillet1_piece_20 - Plane(origin=(0, 0, -0.8), x_dir=(-1, 0, 0), z_dir=(0, -1, 0)) * Cylinder(0.405, 3, mode=Mode.PRIVATE)
    add(fillet1_piece_20, mode=Mode.SUBTRACT)
    with BuildSketch(Plane(origin=(1.09, 0, 0.8), x_dir=(0, 1, 0), z_dir=(-1, 0, 0))) as fillet1_piece_21_section:
        with BuildLine():
            CenterArc((FILLET1_R, FILLET1_R), FILLET1_R, 180, 90)
            Line((0, FILLET1_R), (0, 0))
            Line((0, 0), (FILLET1_R, 0))
        make_face()
    fillet1_piece_21 = extrude(amount=0.935, mode=Mode.PRIVATE)
    fillet1_piece_21 = fillet1_piece_21 - Plane(origin=(0, 0, 0.8), x_dir=(1, 0, 0), z_dir=(0, -1, 0)) * Cylinder(0.405, 3, mode=Mode.PRIVATE)
    add(fillet1_piece_21, mode=Mode.SUBTRACT)

    # Fillet2: read off the stored shape, not the designer's step
    # Fillet2 outline → Fillet2 (cut)
    with BuildSketch(Plane.YZ.offset(FILLET2_START)):
        with BuildLine():
            Line((0.96, 0.82), (0.86, 0.82))
            ThreePointArc((0.86, 0.82), (0.930710678, 0.790710678), (0.96, 0.72))
            Line((0.96, 0.72), (0.96, 0.82))
        make_face()
        with BuildLine():
            ThreePointArc((-0.02, 0.72), (0.009289322, 0.790710678), (0.08, 0.82))
            Line((0.08, 0.82), (-0.02, 0.82))
            Line((-0.02, 0.82), (-0.02, 0.72))
        make_face()
        with BuildLine():
            Line((-0.02, -0.82), (0.08, -0.82))
            ThreePointArc((0.08, -0.82), (0.009289322, -0.790710678), (-0.02, -0.72))
            Line((-0.02, -0.72), (-0.02, -0.82))
        make_face()
        with BuildLine():
            ThreePointArc((0.96, -0.72), (0.930710678, -0.790710678), (0.86, -0.82))
            Line((0.86, -0.82), (0.96, -0.82))
            Line((0.96, -0.82), (0.96, -0.72))
        make_face()
    extrude(amount=FILLET2_DEPTH, mode=Mode.SUBTRACT)


solid = part.part
